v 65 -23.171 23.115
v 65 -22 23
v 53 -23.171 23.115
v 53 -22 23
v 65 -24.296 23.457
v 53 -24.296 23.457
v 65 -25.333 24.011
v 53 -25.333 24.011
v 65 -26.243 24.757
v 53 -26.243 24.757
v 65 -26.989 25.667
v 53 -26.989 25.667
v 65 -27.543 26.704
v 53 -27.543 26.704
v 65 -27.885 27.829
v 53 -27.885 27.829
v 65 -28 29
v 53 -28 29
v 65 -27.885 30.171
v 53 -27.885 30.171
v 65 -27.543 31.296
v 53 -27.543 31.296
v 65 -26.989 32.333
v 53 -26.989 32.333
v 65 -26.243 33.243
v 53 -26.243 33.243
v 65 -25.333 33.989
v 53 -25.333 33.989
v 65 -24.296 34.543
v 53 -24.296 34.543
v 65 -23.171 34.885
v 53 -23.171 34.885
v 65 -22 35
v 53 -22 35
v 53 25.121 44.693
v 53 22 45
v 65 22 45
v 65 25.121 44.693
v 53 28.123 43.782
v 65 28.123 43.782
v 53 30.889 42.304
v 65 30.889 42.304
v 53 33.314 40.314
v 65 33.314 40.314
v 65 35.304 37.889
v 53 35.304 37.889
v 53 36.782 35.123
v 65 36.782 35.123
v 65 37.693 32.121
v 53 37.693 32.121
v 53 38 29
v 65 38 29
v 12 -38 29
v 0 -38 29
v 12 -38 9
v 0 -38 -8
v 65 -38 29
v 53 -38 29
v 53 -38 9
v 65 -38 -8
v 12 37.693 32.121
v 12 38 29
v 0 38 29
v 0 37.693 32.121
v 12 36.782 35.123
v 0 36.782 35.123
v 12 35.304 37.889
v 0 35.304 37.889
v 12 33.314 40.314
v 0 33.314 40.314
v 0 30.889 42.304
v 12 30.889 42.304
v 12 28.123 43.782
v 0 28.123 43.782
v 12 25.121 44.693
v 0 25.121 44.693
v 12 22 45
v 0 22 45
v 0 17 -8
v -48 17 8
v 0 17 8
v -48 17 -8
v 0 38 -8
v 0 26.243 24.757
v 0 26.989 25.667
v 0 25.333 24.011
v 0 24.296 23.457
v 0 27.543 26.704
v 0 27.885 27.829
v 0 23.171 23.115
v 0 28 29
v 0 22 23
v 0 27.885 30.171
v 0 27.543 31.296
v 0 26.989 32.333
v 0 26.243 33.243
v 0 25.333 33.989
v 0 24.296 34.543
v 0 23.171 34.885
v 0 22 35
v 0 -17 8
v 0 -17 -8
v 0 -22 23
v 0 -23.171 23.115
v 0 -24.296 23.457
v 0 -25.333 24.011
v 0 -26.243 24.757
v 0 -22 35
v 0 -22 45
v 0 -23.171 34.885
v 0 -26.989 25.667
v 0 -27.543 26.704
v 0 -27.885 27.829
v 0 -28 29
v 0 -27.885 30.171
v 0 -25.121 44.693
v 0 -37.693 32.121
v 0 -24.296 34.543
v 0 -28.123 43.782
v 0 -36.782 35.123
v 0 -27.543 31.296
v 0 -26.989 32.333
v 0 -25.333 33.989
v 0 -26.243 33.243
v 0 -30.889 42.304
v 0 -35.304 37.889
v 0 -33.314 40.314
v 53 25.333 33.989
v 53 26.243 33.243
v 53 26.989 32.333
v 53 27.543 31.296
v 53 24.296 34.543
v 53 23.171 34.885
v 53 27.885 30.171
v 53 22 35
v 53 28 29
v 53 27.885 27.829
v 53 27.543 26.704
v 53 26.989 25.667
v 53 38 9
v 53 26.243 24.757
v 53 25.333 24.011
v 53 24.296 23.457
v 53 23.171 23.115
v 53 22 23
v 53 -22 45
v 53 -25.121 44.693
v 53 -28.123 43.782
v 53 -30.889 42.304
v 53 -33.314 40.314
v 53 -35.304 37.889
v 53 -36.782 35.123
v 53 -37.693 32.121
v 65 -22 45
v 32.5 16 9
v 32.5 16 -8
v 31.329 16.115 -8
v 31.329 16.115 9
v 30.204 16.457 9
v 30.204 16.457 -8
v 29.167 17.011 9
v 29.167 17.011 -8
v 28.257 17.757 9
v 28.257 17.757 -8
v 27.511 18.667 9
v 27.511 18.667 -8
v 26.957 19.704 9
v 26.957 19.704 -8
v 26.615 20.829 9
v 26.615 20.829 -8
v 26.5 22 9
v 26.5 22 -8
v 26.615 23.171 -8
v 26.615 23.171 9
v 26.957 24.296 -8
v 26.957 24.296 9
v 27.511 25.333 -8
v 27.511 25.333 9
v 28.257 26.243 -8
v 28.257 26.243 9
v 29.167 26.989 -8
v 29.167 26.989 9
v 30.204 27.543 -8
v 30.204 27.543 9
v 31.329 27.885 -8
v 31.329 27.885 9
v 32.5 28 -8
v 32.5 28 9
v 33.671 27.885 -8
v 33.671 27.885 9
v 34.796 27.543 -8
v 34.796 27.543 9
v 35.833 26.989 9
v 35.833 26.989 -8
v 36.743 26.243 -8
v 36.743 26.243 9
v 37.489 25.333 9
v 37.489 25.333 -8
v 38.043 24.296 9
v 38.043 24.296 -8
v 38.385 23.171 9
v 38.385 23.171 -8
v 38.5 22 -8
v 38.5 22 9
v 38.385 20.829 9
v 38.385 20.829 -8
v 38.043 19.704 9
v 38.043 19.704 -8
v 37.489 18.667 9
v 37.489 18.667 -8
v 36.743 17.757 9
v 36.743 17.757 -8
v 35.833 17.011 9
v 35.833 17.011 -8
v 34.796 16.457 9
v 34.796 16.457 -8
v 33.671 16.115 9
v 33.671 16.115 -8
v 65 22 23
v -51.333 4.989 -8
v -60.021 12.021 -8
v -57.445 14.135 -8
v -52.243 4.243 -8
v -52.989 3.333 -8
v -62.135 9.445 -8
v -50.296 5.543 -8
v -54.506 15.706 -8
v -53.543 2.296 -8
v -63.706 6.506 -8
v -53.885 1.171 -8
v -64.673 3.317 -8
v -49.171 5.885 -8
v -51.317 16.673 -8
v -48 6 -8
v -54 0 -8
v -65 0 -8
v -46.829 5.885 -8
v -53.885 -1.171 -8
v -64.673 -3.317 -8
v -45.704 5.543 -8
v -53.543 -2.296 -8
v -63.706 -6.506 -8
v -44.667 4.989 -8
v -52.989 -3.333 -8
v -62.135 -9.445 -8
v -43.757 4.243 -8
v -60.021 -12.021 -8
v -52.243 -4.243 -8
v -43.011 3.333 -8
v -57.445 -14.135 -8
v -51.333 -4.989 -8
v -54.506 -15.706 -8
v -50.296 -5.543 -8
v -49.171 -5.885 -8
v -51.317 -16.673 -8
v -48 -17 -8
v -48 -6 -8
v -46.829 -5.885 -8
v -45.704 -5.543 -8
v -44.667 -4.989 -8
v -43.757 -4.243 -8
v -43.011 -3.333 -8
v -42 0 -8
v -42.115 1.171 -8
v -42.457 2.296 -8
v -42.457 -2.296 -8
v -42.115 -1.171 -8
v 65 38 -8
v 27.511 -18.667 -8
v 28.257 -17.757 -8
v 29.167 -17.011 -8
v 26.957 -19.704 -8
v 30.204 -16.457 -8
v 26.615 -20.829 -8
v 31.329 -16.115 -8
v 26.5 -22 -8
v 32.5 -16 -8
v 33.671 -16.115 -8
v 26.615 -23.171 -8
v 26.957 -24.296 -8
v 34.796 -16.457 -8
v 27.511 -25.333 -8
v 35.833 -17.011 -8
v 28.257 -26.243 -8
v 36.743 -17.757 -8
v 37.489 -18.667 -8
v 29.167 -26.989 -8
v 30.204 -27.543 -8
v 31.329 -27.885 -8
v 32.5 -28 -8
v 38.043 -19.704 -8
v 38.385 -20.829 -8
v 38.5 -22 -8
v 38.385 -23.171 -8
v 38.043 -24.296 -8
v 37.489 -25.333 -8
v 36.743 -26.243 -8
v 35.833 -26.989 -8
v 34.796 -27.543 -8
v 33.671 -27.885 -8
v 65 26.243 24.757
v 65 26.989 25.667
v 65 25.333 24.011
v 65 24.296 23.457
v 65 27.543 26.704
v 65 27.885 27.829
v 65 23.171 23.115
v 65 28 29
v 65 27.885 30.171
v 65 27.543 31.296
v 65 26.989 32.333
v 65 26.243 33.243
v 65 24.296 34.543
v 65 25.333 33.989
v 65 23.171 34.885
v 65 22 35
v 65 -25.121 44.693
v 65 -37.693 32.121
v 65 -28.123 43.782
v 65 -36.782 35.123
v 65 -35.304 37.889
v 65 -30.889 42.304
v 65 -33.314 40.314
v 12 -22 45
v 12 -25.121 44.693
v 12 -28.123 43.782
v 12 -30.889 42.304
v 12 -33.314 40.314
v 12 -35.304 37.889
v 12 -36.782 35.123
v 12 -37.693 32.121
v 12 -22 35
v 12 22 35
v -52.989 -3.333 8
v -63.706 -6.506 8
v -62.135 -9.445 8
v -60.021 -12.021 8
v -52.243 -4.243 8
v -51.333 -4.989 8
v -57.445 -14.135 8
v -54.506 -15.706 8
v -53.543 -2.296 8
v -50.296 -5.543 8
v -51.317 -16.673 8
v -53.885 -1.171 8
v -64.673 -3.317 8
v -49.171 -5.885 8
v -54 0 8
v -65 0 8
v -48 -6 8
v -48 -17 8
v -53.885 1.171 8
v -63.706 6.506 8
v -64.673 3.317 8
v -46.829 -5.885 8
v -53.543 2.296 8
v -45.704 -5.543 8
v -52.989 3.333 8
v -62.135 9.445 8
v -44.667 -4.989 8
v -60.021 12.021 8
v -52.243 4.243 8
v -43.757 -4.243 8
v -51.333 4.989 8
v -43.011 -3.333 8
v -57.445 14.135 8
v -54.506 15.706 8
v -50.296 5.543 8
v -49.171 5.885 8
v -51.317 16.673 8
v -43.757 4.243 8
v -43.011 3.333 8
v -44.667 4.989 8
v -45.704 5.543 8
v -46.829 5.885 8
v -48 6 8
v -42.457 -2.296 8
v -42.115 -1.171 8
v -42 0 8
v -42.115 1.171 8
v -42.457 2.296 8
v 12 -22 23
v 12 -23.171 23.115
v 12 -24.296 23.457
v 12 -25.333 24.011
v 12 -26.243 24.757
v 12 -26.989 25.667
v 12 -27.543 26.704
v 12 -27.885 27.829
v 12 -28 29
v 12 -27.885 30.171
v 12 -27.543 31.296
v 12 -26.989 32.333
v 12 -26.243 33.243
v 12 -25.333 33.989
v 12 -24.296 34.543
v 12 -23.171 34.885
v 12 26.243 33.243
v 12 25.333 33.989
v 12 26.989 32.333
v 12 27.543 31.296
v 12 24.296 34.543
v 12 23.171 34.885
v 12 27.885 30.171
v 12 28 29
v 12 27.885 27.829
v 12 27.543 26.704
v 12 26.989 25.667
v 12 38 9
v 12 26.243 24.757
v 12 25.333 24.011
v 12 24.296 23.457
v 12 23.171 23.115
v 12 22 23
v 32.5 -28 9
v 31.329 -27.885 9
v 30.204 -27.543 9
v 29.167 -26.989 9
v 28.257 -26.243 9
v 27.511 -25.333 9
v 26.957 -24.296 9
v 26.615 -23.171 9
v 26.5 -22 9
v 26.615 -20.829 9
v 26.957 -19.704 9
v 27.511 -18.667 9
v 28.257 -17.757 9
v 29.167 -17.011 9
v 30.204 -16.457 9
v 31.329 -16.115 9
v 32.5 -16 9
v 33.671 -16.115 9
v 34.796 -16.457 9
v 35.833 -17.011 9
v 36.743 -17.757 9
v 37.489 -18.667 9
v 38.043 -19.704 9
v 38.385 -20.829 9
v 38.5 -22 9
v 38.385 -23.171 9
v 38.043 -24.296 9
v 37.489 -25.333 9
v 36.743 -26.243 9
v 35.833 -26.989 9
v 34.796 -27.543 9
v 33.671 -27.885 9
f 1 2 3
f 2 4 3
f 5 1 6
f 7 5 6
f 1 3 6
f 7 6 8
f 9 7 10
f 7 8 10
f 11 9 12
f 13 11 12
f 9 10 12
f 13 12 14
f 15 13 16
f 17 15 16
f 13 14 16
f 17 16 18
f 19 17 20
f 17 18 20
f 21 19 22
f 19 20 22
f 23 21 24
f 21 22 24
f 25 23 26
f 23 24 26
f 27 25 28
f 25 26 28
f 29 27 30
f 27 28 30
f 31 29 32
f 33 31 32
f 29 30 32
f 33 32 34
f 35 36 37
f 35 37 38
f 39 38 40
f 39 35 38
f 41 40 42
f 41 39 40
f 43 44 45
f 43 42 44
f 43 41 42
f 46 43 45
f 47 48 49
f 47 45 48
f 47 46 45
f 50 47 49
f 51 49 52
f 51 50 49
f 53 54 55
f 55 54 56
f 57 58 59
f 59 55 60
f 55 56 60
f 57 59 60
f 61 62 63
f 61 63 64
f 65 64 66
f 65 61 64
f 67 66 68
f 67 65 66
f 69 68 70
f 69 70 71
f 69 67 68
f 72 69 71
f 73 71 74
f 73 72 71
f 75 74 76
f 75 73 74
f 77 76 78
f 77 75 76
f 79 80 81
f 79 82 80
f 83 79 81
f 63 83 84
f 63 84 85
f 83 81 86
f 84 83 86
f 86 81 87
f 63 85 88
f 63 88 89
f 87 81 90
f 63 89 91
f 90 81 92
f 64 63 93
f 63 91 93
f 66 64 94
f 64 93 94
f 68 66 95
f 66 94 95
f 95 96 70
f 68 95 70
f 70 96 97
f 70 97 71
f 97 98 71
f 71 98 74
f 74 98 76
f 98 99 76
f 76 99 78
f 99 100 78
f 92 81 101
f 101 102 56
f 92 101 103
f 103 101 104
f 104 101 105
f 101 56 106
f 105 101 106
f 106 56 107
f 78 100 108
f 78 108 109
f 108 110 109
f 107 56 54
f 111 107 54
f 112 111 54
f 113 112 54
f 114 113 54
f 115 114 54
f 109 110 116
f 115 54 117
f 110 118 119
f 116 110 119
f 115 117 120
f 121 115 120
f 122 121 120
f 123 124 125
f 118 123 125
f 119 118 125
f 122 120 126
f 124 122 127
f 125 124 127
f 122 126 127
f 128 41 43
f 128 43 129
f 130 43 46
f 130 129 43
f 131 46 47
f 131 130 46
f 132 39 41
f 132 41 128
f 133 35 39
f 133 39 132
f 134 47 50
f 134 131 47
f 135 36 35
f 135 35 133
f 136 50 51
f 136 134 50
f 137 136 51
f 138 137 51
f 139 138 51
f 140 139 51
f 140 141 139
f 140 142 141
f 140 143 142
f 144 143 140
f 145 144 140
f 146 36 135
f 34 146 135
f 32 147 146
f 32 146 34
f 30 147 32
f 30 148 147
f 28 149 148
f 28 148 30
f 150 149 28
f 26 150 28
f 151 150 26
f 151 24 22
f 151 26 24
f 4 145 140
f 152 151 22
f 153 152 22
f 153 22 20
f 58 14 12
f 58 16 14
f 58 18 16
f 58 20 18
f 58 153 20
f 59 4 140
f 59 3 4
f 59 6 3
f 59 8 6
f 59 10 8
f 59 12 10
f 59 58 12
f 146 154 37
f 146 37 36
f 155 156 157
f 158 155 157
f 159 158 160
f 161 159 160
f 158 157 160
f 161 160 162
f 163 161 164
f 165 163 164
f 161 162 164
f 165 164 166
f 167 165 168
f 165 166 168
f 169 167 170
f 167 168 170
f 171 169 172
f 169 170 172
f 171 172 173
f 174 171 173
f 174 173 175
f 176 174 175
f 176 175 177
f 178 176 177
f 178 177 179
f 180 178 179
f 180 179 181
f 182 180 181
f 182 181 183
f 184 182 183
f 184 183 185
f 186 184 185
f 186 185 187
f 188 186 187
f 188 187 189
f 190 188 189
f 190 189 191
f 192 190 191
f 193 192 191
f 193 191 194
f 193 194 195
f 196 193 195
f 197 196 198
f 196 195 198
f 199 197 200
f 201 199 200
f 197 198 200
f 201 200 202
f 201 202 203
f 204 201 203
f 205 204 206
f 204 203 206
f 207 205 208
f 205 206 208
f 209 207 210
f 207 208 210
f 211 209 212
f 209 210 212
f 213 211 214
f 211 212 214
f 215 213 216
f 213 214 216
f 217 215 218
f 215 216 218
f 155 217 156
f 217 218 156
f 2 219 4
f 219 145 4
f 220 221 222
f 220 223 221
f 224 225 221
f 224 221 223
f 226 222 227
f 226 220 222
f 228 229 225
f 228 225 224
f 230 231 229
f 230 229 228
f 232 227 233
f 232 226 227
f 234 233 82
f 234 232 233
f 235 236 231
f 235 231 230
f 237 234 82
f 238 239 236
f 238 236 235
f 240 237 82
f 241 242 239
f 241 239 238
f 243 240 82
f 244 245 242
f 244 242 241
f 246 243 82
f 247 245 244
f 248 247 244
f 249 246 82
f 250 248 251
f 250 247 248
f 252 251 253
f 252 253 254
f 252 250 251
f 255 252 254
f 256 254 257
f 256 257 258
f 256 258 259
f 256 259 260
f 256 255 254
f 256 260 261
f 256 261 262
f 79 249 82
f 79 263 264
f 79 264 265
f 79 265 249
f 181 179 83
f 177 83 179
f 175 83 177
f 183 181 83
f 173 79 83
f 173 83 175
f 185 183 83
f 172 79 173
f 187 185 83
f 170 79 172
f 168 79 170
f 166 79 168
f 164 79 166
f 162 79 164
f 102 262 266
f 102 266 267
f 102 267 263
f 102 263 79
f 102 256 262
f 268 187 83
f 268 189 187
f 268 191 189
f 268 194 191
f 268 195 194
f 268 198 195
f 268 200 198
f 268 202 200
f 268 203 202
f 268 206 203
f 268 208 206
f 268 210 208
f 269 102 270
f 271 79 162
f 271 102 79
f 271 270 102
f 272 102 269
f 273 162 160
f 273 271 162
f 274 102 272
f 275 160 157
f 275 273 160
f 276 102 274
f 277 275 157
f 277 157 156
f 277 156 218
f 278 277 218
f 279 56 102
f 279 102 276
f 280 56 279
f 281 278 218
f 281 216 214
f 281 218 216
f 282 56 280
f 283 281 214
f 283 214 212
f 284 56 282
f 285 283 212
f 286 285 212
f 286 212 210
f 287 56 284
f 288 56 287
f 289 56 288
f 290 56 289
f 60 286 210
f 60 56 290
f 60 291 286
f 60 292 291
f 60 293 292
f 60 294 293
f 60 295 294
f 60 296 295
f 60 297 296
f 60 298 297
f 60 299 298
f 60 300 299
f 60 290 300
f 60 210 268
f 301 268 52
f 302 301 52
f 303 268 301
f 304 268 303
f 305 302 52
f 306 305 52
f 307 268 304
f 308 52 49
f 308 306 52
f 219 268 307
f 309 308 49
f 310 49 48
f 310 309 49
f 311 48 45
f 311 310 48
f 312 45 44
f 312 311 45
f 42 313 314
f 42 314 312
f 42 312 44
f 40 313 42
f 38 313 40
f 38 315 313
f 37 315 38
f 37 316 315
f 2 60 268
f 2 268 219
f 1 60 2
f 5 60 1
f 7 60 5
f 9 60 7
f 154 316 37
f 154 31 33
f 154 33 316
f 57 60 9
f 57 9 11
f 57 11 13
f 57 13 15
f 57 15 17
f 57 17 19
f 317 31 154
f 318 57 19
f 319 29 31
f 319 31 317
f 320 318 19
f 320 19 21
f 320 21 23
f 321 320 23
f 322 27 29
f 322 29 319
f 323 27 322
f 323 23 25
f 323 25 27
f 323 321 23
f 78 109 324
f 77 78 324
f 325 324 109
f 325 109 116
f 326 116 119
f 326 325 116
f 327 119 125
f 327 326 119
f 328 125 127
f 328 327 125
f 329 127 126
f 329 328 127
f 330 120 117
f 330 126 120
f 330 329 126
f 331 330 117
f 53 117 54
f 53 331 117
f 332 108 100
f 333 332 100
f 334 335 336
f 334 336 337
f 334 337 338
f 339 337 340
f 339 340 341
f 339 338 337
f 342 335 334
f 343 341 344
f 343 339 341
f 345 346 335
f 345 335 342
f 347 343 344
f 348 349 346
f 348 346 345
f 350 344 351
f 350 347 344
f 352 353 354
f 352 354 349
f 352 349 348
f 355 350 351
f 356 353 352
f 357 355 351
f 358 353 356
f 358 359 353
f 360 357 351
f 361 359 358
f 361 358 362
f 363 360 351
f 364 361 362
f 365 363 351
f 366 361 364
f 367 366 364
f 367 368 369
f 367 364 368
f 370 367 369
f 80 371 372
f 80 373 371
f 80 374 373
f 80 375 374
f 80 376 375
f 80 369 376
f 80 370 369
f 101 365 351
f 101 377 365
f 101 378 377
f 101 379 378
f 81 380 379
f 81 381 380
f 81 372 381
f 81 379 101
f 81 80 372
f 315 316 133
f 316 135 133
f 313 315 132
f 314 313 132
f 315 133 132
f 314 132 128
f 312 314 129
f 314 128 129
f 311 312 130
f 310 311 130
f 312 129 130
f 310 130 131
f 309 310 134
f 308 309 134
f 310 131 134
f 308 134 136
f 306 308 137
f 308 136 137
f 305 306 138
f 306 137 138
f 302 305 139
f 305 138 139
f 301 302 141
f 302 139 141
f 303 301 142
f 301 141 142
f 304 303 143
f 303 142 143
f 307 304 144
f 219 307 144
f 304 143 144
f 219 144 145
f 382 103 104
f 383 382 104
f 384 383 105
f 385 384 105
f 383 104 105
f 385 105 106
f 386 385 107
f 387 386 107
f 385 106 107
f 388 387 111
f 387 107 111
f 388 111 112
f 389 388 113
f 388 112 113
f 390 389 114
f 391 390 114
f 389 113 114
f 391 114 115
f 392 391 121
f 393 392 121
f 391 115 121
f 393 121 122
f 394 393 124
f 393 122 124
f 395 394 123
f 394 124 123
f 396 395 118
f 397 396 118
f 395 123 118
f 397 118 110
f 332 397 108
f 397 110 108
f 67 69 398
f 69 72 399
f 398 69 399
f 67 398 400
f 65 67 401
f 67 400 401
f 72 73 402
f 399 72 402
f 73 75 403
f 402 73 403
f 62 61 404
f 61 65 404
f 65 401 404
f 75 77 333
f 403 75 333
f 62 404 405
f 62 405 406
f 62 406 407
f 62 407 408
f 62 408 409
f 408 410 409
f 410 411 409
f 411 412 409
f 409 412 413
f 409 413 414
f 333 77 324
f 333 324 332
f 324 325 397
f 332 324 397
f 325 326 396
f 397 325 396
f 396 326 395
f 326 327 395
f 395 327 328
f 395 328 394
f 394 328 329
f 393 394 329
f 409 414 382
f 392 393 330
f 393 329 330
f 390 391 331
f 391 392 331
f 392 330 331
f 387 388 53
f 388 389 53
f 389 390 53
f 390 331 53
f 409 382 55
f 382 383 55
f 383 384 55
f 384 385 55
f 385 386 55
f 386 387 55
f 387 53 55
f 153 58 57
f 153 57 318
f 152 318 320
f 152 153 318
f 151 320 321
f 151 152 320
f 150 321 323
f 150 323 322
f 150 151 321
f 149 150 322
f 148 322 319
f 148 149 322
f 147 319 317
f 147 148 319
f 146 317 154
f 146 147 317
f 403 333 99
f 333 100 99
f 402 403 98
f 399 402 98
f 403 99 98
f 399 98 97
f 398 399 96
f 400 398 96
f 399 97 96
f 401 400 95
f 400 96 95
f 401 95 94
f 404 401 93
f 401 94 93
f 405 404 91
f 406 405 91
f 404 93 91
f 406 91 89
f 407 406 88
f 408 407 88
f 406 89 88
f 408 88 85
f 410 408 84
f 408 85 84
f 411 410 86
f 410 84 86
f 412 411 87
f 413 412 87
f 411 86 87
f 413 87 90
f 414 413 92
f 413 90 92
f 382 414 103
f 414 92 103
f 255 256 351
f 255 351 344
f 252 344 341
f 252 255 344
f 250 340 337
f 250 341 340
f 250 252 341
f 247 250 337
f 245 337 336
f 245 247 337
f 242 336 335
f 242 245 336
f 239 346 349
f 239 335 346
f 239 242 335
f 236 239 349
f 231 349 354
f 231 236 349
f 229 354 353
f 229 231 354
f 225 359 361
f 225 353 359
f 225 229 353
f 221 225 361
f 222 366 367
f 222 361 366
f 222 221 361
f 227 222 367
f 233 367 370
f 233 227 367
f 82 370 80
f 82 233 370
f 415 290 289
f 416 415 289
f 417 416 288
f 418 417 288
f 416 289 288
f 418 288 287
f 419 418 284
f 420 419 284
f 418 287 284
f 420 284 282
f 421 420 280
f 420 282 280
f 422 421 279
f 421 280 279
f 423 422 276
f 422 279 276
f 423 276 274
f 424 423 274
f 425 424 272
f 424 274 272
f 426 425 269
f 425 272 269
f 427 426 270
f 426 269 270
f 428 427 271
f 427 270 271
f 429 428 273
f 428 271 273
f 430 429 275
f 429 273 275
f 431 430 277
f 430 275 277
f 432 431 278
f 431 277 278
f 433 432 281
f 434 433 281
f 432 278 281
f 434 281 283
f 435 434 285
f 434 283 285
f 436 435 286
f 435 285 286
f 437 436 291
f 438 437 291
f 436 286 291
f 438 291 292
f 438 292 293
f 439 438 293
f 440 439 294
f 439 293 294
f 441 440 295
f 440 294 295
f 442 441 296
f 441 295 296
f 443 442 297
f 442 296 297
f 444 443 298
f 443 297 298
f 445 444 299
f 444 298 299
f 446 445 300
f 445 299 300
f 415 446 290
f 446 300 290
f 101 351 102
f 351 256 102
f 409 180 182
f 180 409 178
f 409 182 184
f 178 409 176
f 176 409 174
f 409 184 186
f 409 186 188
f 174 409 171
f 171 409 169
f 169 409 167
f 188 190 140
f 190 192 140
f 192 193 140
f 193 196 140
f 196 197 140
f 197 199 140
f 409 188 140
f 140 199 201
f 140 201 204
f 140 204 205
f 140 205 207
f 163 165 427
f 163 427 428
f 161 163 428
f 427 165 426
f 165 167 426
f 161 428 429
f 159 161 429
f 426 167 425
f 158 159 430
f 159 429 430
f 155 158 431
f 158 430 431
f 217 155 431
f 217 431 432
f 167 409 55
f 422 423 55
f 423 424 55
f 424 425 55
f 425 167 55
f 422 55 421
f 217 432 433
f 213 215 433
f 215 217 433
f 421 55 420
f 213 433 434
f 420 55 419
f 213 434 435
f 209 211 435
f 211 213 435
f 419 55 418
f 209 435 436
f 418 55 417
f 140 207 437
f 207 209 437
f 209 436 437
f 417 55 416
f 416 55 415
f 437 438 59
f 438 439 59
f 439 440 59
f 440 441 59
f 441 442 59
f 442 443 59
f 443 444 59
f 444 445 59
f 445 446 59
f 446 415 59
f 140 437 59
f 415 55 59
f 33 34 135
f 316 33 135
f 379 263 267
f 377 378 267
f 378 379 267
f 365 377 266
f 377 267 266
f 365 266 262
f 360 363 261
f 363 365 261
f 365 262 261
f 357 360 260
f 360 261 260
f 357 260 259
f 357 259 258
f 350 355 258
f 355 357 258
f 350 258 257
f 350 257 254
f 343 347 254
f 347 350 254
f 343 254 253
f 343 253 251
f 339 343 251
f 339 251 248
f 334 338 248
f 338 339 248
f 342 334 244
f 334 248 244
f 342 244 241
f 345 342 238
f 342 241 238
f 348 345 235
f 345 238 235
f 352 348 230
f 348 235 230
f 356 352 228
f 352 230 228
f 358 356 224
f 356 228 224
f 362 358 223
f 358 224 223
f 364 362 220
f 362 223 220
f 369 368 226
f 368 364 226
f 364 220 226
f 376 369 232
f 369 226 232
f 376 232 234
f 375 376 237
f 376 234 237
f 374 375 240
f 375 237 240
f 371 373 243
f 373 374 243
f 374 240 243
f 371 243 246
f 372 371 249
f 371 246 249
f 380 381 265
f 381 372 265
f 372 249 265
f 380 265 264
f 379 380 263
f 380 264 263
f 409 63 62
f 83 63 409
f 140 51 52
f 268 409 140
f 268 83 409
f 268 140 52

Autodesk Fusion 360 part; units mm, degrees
sketch "Sketch1" plane through (0, 0, 0) normal (0, 0, 1) x (1, 0, 0)
  circle A0 centre (-48, 0) radius 6
  line L0 (-48, -17) -> (0, -17)
  line L1 (-48, 17) -> (0, 17)
  line L2 (0, 17) -> (0, -17)
  arc A1 (-48, 17) -> (-48, -17) centre (-48, 0) ccw
  dimension "d1" = 48
  dimension "d2" = 12
  dimension "d3" = 34
  dimension "d5" = 48
extrude "Extrude1" add sketch "Sketch1" along normal mid plane 16
sketch "Sketch2" plane through (0, 0, 0) normal (0, 1, 0) x (1, 0, 0)
  line L0 (0, 8) -> (65, 8)
  line L1 (0, 8) -> (0, -45)
  line L2 (0, -45) -> (12, -45)
  line L3 (12, -45) -> (12, -9)
  line L4 (12, -9) -> (53, -9)
  line L5 (65, 8) -> (65, -45)
  line L6 (65, -45) -> (53, -45)
  line L7 (53, -45) -> (53, -9)
  dimension "d8" = 65
  dimension "d9" = 53
  dimension "d10" = 12
  dimension "d11" = 41
  dimension "d12" = 53
  dimension "d13" = 12
extrude "Extrude2" add sketch "Sketch2" along normal mid plane 76
fillet "Fillet1" radius 16 4 edges at (6, 38, 45) (6, -38, 45) (59, -38, 45) (59, 38, 45)
sketch "Sketch3" plane through (0, 0, 0) normal (-1, 0, 0) x (0, -1, 0)
  arc A0 (38, 29) -> (22, 45) centre (22, 29) ccw
  line L0 (22, 45) -> (-22, 45)
  arc A1 (-22, 45) -> (-38, 29) centre (-22, 29) ccw
  line L1 (-38, 29) -> (-38, -8)
  line L2 (-38, -8) -> (-17, -8)
  line L3 (-17, -8) -> (-17, 8)
  line L4 (-17, 8) -> (17, 8)
  line L5 (17, 8) -> (17, -8)
  line L6 (17, -8) -> (38, -8)
  line L7 (38, -8) -> (38, 29)
  line L8 (-22, 23) -> (22, 23)
  arc A2 (22, 23) -> (22, 35) centre (22, 29) ccw
  line L9 (22, 35) -> (-22, 35)
  arc A3 (-22, 35) -> (-22, 23) centre (-22, 29) ccw
  line L10 (-22, 29) -> (22, 29) construction
  dimension "d18" = 44
  dimension "d19" = 6
  dimension "d21" = 21
extrude "Extrude3" cut sketch "Sketch3" against normal blind 65 contours L8 A2 L9 A3
sketch "Sketch4" plane through (0, 0, 9) normal (0, 0, 1) x (-1, 0, 0)
  line L0 (-53, 38) -> (-53, -38)
  line L1 (-53, -38) -> (-12, -38)
  line L2 (-12, -38) -> (-12, 38)
  line L3 (-12, 38) -> (-53, 38)
  point P0 (-32.5, -22)
  point P1 (-32.5, 22)
  dimension "d24" = 44
  dimension "d25" = 16
  dimension "d26" = 20.5
hole "Hole1" at (32.5, 22, 9) at (32.5, -22, 9) direction (0, 0, -1) diameter 12 depth 65 tip angle 118
